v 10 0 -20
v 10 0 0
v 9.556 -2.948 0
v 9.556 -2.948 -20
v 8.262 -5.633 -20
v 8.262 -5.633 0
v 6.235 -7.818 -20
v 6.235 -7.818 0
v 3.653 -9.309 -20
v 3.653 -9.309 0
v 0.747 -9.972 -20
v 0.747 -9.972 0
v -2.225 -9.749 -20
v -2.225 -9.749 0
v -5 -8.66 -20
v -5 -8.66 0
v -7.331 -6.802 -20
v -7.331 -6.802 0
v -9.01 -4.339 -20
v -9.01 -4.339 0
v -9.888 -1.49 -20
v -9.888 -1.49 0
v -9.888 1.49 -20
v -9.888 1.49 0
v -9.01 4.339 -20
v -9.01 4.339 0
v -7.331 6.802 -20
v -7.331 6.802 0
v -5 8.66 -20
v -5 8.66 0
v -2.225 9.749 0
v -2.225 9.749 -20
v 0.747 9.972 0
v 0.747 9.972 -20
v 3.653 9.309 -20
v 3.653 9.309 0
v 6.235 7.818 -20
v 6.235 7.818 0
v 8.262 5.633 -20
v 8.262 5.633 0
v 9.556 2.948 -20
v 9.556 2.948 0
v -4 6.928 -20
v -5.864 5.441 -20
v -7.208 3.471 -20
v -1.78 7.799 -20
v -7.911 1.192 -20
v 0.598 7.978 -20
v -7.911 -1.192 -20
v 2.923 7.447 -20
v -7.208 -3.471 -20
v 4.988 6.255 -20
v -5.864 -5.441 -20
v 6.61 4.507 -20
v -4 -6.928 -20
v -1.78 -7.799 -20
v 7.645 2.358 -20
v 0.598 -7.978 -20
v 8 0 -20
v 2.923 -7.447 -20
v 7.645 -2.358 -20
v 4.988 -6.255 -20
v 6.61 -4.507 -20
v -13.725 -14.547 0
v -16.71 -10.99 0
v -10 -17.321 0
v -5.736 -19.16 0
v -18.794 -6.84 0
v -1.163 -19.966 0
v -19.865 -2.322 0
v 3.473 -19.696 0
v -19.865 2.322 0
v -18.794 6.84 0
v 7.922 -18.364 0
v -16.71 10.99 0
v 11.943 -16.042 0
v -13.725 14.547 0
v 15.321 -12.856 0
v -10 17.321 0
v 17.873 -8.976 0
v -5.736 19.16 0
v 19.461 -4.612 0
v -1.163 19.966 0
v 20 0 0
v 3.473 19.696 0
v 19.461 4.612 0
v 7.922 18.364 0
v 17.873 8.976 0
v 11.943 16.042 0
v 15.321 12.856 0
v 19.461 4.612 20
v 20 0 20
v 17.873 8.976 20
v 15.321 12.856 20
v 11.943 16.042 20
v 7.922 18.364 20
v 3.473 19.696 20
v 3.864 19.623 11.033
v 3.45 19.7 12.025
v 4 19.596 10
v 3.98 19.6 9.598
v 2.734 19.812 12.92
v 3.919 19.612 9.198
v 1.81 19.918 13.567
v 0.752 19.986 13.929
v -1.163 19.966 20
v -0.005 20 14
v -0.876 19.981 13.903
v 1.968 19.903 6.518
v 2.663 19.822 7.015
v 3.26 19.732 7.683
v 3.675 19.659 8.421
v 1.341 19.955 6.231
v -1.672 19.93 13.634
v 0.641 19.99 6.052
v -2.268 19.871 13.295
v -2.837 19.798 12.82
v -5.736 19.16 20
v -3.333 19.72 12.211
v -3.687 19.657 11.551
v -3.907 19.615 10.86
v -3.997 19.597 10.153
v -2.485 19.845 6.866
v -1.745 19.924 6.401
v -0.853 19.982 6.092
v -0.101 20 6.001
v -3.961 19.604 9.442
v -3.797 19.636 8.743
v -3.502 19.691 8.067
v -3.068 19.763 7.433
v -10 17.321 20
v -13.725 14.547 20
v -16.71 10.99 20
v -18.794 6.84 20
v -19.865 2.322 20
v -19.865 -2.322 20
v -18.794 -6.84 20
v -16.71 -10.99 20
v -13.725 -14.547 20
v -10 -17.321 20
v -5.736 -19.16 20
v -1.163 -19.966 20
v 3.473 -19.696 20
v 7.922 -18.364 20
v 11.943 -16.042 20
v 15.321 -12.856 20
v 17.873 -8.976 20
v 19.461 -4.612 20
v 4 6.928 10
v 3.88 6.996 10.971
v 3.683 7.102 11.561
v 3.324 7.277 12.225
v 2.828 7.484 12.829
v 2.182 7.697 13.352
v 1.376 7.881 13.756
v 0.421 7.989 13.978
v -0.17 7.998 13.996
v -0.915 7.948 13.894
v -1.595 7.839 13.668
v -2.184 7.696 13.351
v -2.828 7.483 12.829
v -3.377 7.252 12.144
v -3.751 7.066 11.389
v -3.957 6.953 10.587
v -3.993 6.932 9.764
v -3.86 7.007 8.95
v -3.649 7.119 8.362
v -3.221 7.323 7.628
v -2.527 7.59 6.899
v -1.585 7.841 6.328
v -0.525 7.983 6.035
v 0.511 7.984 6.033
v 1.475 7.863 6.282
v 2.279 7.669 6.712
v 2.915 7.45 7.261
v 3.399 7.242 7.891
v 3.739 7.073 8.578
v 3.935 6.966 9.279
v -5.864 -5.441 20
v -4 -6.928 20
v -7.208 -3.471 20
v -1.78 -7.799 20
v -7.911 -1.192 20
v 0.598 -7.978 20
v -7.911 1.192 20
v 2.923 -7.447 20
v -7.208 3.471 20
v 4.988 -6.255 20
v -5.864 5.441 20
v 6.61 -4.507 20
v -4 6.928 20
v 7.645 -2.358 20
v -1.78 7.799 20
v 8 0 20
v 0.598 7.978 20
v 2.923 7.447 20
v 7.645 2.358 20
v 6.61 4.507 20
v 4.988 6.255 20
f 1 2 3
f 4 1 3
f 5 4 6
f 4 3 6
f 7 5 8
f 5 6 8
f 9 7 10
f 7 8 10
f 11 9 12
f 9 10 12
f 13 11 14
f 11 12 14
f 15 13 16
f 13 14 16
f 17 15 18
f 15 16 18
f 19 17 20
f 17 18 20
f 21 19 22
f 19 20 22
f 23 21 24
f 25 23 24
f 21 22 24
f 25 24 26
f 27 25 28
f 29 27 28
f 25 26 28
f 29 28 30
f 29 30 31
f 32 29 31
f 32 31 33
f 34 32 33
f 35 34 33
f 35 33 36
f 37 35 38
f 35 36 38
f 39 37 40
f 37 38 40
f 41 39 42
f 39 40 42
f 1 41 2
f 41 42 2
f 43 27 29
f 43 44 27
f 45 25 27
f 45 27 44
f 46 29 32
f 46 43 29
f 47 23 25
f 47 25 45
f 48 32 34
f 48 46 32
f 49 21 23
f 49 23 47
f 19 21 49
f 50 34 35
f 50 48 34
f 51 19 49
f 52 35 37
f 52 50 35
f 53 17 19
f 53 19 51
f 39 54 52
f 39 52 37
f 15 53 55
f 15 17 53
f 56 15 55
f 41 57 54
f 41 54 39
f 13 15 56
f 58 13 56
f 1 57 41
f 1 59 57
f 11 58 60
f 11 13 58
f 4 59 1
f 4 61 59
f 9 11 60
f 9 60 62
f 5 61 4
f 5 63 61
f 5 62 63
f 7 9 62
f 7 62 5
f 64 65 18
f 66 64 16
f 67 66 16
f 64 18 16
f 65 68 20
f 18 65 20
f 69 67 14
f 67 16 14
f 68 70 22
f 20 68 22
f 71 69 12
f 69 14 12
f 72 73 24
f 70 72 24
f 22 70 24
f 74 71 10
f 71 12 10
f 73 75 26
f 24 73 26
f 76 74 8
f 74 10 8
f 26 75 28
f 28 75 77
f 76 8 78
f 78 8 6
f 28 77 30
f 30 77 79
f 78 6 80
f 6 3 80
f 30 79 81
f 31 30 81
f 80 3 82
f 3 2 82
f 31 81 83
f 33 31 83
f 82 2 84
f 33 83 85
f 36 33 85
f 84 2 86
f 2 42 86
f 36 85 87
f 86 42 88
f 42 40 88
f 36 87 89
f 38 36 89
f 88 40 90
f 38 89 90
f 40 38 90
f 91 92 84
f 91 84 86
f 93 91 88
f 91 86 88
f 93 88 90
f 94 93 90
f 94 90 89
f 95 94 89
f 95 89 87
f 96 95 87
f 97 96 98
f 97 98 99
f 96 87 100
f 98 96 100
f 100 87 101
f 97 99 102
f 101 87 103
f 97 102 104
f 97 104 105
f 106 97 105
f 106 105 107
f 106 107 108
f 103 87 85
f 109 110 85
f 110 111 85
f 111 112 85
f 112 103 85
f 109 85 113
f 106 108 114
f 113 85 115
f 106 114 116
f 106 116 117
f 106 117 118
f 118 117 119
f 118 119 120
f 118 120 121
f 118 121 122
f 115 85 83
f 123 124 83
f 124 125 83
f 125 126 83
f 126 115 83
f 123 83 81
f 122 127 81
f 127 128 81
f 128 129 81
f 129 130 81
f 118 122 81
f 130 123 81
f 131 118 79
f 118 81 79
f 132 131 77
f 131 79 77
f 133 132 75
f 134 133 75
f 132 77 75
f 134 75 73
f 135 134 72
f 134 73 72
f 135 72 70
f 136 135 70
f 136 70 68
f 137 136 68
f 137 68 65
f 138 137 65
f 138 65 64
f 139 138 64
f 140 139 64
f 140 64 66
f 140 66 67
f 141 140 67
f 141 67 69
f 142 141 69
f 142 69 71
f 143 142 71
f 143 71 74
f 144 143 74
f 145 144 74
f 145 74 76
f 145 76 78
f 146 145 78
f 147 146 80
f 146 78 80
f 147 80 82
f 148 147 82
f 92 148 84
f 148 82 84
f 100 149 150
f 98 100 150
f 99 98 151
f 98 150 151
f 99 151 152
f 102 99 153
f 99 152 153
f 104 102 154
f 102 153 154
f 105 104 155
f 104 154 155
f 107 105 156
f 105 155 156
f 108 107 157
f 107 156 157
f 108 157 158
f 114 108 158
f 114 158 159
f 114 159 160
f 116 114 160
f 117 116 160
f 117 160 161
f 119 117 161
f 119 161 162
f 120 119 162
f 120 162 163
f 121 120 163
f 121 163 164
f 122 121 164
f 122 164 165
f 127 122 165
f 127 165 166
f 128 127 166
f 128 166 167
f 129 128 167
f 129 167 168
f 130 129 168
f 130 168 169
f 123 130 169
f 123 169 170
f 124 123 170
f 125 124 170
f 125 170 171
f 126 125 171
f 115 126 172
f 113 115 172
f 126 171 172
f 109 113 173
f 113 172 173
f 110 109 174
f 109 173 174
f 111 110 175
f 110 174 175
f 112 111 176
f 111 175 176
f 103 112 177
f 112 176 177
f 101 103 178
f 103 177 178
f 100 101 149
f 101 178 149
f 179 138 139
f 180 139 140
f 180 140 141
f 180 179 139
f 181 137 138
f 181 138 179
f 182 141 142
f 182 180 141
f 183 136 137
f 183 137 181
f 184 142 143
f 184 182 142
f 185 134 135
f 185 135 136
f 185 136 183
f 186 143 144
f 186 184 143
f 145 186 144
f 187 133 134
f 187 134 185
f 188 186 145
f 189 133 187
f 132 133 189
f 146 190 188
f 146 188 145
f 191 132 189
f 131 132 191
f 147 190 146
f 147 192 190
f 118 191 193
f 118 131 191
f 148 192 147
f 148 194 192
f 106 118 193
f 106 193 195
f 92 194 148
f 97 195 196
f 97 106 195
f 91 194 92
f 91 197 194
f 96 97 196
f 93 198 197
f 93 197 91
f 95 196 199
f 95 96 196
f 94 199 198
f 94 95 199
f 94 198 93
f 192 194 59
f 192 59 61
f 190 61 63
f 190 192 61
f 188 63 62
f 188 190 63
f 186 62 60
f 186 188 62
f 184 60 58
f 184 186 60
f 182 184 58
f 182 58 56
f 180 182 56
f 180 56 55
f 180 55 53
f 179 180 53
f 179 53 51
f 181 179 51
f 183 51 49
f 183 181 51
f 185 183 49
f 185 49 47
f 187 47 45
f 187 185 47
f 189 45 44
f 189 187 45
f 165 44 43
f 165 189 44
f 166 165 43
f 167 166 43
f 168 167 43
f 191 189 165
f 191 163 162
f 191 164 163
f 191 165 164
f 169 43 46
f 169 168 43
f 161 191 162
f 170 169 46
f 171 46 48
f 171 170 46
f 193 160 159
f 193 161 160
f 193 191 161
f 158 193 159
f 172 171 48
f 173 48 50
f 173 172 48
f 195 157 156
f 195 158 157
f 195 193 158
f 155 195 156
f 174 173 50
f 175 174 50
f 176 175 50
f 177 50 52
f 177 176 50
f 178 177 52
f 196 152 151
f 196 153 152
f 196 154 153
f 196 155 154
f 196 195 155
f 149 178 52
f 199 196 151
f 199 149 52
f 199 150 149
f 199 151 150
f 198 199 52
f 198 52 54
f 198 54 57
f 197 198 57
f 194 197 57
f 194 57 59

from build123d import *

# Parameters (mm, degrees)
F0_R     = 20
F0_R_2   = 8
F1_DEPTH = 20
F2_R     = 10
F2_R_2   = 8
F3_DEPTH = 20
F4_R     = 4
F5_DEPTH = 25


with BuildPart() as f1:
    # F0 (on Top) → F1 (new body)
    with BuildSketch(Plane.XY):
        Circle(F0_R)
        Circle(F0_R_2, mode=Mode.SUBTRACT)
    extrude(amount=F1_DEPTH)

    # F2 (on face) → F3 (join)
    with BuildSketch(Plane(origin=(0, 0, 0), x_dir=(1, 0, 0), z_dir=(0, 0, -1))):
        Circle(F2_R)
        Circle(F2_R_2, mode=Mode.SUBTRACT)
    extrude(amount=F3_DEPTH)

    # F4 (on Front) → F5 (cut)
    with BuildSketch(Plane.XZ):
        with Locations((0, 10)):
            Circle(F4_R)
    extrude(amount=-F5_DEPTH, mode=Mode.SUBTRACT)


solid = f1.part
